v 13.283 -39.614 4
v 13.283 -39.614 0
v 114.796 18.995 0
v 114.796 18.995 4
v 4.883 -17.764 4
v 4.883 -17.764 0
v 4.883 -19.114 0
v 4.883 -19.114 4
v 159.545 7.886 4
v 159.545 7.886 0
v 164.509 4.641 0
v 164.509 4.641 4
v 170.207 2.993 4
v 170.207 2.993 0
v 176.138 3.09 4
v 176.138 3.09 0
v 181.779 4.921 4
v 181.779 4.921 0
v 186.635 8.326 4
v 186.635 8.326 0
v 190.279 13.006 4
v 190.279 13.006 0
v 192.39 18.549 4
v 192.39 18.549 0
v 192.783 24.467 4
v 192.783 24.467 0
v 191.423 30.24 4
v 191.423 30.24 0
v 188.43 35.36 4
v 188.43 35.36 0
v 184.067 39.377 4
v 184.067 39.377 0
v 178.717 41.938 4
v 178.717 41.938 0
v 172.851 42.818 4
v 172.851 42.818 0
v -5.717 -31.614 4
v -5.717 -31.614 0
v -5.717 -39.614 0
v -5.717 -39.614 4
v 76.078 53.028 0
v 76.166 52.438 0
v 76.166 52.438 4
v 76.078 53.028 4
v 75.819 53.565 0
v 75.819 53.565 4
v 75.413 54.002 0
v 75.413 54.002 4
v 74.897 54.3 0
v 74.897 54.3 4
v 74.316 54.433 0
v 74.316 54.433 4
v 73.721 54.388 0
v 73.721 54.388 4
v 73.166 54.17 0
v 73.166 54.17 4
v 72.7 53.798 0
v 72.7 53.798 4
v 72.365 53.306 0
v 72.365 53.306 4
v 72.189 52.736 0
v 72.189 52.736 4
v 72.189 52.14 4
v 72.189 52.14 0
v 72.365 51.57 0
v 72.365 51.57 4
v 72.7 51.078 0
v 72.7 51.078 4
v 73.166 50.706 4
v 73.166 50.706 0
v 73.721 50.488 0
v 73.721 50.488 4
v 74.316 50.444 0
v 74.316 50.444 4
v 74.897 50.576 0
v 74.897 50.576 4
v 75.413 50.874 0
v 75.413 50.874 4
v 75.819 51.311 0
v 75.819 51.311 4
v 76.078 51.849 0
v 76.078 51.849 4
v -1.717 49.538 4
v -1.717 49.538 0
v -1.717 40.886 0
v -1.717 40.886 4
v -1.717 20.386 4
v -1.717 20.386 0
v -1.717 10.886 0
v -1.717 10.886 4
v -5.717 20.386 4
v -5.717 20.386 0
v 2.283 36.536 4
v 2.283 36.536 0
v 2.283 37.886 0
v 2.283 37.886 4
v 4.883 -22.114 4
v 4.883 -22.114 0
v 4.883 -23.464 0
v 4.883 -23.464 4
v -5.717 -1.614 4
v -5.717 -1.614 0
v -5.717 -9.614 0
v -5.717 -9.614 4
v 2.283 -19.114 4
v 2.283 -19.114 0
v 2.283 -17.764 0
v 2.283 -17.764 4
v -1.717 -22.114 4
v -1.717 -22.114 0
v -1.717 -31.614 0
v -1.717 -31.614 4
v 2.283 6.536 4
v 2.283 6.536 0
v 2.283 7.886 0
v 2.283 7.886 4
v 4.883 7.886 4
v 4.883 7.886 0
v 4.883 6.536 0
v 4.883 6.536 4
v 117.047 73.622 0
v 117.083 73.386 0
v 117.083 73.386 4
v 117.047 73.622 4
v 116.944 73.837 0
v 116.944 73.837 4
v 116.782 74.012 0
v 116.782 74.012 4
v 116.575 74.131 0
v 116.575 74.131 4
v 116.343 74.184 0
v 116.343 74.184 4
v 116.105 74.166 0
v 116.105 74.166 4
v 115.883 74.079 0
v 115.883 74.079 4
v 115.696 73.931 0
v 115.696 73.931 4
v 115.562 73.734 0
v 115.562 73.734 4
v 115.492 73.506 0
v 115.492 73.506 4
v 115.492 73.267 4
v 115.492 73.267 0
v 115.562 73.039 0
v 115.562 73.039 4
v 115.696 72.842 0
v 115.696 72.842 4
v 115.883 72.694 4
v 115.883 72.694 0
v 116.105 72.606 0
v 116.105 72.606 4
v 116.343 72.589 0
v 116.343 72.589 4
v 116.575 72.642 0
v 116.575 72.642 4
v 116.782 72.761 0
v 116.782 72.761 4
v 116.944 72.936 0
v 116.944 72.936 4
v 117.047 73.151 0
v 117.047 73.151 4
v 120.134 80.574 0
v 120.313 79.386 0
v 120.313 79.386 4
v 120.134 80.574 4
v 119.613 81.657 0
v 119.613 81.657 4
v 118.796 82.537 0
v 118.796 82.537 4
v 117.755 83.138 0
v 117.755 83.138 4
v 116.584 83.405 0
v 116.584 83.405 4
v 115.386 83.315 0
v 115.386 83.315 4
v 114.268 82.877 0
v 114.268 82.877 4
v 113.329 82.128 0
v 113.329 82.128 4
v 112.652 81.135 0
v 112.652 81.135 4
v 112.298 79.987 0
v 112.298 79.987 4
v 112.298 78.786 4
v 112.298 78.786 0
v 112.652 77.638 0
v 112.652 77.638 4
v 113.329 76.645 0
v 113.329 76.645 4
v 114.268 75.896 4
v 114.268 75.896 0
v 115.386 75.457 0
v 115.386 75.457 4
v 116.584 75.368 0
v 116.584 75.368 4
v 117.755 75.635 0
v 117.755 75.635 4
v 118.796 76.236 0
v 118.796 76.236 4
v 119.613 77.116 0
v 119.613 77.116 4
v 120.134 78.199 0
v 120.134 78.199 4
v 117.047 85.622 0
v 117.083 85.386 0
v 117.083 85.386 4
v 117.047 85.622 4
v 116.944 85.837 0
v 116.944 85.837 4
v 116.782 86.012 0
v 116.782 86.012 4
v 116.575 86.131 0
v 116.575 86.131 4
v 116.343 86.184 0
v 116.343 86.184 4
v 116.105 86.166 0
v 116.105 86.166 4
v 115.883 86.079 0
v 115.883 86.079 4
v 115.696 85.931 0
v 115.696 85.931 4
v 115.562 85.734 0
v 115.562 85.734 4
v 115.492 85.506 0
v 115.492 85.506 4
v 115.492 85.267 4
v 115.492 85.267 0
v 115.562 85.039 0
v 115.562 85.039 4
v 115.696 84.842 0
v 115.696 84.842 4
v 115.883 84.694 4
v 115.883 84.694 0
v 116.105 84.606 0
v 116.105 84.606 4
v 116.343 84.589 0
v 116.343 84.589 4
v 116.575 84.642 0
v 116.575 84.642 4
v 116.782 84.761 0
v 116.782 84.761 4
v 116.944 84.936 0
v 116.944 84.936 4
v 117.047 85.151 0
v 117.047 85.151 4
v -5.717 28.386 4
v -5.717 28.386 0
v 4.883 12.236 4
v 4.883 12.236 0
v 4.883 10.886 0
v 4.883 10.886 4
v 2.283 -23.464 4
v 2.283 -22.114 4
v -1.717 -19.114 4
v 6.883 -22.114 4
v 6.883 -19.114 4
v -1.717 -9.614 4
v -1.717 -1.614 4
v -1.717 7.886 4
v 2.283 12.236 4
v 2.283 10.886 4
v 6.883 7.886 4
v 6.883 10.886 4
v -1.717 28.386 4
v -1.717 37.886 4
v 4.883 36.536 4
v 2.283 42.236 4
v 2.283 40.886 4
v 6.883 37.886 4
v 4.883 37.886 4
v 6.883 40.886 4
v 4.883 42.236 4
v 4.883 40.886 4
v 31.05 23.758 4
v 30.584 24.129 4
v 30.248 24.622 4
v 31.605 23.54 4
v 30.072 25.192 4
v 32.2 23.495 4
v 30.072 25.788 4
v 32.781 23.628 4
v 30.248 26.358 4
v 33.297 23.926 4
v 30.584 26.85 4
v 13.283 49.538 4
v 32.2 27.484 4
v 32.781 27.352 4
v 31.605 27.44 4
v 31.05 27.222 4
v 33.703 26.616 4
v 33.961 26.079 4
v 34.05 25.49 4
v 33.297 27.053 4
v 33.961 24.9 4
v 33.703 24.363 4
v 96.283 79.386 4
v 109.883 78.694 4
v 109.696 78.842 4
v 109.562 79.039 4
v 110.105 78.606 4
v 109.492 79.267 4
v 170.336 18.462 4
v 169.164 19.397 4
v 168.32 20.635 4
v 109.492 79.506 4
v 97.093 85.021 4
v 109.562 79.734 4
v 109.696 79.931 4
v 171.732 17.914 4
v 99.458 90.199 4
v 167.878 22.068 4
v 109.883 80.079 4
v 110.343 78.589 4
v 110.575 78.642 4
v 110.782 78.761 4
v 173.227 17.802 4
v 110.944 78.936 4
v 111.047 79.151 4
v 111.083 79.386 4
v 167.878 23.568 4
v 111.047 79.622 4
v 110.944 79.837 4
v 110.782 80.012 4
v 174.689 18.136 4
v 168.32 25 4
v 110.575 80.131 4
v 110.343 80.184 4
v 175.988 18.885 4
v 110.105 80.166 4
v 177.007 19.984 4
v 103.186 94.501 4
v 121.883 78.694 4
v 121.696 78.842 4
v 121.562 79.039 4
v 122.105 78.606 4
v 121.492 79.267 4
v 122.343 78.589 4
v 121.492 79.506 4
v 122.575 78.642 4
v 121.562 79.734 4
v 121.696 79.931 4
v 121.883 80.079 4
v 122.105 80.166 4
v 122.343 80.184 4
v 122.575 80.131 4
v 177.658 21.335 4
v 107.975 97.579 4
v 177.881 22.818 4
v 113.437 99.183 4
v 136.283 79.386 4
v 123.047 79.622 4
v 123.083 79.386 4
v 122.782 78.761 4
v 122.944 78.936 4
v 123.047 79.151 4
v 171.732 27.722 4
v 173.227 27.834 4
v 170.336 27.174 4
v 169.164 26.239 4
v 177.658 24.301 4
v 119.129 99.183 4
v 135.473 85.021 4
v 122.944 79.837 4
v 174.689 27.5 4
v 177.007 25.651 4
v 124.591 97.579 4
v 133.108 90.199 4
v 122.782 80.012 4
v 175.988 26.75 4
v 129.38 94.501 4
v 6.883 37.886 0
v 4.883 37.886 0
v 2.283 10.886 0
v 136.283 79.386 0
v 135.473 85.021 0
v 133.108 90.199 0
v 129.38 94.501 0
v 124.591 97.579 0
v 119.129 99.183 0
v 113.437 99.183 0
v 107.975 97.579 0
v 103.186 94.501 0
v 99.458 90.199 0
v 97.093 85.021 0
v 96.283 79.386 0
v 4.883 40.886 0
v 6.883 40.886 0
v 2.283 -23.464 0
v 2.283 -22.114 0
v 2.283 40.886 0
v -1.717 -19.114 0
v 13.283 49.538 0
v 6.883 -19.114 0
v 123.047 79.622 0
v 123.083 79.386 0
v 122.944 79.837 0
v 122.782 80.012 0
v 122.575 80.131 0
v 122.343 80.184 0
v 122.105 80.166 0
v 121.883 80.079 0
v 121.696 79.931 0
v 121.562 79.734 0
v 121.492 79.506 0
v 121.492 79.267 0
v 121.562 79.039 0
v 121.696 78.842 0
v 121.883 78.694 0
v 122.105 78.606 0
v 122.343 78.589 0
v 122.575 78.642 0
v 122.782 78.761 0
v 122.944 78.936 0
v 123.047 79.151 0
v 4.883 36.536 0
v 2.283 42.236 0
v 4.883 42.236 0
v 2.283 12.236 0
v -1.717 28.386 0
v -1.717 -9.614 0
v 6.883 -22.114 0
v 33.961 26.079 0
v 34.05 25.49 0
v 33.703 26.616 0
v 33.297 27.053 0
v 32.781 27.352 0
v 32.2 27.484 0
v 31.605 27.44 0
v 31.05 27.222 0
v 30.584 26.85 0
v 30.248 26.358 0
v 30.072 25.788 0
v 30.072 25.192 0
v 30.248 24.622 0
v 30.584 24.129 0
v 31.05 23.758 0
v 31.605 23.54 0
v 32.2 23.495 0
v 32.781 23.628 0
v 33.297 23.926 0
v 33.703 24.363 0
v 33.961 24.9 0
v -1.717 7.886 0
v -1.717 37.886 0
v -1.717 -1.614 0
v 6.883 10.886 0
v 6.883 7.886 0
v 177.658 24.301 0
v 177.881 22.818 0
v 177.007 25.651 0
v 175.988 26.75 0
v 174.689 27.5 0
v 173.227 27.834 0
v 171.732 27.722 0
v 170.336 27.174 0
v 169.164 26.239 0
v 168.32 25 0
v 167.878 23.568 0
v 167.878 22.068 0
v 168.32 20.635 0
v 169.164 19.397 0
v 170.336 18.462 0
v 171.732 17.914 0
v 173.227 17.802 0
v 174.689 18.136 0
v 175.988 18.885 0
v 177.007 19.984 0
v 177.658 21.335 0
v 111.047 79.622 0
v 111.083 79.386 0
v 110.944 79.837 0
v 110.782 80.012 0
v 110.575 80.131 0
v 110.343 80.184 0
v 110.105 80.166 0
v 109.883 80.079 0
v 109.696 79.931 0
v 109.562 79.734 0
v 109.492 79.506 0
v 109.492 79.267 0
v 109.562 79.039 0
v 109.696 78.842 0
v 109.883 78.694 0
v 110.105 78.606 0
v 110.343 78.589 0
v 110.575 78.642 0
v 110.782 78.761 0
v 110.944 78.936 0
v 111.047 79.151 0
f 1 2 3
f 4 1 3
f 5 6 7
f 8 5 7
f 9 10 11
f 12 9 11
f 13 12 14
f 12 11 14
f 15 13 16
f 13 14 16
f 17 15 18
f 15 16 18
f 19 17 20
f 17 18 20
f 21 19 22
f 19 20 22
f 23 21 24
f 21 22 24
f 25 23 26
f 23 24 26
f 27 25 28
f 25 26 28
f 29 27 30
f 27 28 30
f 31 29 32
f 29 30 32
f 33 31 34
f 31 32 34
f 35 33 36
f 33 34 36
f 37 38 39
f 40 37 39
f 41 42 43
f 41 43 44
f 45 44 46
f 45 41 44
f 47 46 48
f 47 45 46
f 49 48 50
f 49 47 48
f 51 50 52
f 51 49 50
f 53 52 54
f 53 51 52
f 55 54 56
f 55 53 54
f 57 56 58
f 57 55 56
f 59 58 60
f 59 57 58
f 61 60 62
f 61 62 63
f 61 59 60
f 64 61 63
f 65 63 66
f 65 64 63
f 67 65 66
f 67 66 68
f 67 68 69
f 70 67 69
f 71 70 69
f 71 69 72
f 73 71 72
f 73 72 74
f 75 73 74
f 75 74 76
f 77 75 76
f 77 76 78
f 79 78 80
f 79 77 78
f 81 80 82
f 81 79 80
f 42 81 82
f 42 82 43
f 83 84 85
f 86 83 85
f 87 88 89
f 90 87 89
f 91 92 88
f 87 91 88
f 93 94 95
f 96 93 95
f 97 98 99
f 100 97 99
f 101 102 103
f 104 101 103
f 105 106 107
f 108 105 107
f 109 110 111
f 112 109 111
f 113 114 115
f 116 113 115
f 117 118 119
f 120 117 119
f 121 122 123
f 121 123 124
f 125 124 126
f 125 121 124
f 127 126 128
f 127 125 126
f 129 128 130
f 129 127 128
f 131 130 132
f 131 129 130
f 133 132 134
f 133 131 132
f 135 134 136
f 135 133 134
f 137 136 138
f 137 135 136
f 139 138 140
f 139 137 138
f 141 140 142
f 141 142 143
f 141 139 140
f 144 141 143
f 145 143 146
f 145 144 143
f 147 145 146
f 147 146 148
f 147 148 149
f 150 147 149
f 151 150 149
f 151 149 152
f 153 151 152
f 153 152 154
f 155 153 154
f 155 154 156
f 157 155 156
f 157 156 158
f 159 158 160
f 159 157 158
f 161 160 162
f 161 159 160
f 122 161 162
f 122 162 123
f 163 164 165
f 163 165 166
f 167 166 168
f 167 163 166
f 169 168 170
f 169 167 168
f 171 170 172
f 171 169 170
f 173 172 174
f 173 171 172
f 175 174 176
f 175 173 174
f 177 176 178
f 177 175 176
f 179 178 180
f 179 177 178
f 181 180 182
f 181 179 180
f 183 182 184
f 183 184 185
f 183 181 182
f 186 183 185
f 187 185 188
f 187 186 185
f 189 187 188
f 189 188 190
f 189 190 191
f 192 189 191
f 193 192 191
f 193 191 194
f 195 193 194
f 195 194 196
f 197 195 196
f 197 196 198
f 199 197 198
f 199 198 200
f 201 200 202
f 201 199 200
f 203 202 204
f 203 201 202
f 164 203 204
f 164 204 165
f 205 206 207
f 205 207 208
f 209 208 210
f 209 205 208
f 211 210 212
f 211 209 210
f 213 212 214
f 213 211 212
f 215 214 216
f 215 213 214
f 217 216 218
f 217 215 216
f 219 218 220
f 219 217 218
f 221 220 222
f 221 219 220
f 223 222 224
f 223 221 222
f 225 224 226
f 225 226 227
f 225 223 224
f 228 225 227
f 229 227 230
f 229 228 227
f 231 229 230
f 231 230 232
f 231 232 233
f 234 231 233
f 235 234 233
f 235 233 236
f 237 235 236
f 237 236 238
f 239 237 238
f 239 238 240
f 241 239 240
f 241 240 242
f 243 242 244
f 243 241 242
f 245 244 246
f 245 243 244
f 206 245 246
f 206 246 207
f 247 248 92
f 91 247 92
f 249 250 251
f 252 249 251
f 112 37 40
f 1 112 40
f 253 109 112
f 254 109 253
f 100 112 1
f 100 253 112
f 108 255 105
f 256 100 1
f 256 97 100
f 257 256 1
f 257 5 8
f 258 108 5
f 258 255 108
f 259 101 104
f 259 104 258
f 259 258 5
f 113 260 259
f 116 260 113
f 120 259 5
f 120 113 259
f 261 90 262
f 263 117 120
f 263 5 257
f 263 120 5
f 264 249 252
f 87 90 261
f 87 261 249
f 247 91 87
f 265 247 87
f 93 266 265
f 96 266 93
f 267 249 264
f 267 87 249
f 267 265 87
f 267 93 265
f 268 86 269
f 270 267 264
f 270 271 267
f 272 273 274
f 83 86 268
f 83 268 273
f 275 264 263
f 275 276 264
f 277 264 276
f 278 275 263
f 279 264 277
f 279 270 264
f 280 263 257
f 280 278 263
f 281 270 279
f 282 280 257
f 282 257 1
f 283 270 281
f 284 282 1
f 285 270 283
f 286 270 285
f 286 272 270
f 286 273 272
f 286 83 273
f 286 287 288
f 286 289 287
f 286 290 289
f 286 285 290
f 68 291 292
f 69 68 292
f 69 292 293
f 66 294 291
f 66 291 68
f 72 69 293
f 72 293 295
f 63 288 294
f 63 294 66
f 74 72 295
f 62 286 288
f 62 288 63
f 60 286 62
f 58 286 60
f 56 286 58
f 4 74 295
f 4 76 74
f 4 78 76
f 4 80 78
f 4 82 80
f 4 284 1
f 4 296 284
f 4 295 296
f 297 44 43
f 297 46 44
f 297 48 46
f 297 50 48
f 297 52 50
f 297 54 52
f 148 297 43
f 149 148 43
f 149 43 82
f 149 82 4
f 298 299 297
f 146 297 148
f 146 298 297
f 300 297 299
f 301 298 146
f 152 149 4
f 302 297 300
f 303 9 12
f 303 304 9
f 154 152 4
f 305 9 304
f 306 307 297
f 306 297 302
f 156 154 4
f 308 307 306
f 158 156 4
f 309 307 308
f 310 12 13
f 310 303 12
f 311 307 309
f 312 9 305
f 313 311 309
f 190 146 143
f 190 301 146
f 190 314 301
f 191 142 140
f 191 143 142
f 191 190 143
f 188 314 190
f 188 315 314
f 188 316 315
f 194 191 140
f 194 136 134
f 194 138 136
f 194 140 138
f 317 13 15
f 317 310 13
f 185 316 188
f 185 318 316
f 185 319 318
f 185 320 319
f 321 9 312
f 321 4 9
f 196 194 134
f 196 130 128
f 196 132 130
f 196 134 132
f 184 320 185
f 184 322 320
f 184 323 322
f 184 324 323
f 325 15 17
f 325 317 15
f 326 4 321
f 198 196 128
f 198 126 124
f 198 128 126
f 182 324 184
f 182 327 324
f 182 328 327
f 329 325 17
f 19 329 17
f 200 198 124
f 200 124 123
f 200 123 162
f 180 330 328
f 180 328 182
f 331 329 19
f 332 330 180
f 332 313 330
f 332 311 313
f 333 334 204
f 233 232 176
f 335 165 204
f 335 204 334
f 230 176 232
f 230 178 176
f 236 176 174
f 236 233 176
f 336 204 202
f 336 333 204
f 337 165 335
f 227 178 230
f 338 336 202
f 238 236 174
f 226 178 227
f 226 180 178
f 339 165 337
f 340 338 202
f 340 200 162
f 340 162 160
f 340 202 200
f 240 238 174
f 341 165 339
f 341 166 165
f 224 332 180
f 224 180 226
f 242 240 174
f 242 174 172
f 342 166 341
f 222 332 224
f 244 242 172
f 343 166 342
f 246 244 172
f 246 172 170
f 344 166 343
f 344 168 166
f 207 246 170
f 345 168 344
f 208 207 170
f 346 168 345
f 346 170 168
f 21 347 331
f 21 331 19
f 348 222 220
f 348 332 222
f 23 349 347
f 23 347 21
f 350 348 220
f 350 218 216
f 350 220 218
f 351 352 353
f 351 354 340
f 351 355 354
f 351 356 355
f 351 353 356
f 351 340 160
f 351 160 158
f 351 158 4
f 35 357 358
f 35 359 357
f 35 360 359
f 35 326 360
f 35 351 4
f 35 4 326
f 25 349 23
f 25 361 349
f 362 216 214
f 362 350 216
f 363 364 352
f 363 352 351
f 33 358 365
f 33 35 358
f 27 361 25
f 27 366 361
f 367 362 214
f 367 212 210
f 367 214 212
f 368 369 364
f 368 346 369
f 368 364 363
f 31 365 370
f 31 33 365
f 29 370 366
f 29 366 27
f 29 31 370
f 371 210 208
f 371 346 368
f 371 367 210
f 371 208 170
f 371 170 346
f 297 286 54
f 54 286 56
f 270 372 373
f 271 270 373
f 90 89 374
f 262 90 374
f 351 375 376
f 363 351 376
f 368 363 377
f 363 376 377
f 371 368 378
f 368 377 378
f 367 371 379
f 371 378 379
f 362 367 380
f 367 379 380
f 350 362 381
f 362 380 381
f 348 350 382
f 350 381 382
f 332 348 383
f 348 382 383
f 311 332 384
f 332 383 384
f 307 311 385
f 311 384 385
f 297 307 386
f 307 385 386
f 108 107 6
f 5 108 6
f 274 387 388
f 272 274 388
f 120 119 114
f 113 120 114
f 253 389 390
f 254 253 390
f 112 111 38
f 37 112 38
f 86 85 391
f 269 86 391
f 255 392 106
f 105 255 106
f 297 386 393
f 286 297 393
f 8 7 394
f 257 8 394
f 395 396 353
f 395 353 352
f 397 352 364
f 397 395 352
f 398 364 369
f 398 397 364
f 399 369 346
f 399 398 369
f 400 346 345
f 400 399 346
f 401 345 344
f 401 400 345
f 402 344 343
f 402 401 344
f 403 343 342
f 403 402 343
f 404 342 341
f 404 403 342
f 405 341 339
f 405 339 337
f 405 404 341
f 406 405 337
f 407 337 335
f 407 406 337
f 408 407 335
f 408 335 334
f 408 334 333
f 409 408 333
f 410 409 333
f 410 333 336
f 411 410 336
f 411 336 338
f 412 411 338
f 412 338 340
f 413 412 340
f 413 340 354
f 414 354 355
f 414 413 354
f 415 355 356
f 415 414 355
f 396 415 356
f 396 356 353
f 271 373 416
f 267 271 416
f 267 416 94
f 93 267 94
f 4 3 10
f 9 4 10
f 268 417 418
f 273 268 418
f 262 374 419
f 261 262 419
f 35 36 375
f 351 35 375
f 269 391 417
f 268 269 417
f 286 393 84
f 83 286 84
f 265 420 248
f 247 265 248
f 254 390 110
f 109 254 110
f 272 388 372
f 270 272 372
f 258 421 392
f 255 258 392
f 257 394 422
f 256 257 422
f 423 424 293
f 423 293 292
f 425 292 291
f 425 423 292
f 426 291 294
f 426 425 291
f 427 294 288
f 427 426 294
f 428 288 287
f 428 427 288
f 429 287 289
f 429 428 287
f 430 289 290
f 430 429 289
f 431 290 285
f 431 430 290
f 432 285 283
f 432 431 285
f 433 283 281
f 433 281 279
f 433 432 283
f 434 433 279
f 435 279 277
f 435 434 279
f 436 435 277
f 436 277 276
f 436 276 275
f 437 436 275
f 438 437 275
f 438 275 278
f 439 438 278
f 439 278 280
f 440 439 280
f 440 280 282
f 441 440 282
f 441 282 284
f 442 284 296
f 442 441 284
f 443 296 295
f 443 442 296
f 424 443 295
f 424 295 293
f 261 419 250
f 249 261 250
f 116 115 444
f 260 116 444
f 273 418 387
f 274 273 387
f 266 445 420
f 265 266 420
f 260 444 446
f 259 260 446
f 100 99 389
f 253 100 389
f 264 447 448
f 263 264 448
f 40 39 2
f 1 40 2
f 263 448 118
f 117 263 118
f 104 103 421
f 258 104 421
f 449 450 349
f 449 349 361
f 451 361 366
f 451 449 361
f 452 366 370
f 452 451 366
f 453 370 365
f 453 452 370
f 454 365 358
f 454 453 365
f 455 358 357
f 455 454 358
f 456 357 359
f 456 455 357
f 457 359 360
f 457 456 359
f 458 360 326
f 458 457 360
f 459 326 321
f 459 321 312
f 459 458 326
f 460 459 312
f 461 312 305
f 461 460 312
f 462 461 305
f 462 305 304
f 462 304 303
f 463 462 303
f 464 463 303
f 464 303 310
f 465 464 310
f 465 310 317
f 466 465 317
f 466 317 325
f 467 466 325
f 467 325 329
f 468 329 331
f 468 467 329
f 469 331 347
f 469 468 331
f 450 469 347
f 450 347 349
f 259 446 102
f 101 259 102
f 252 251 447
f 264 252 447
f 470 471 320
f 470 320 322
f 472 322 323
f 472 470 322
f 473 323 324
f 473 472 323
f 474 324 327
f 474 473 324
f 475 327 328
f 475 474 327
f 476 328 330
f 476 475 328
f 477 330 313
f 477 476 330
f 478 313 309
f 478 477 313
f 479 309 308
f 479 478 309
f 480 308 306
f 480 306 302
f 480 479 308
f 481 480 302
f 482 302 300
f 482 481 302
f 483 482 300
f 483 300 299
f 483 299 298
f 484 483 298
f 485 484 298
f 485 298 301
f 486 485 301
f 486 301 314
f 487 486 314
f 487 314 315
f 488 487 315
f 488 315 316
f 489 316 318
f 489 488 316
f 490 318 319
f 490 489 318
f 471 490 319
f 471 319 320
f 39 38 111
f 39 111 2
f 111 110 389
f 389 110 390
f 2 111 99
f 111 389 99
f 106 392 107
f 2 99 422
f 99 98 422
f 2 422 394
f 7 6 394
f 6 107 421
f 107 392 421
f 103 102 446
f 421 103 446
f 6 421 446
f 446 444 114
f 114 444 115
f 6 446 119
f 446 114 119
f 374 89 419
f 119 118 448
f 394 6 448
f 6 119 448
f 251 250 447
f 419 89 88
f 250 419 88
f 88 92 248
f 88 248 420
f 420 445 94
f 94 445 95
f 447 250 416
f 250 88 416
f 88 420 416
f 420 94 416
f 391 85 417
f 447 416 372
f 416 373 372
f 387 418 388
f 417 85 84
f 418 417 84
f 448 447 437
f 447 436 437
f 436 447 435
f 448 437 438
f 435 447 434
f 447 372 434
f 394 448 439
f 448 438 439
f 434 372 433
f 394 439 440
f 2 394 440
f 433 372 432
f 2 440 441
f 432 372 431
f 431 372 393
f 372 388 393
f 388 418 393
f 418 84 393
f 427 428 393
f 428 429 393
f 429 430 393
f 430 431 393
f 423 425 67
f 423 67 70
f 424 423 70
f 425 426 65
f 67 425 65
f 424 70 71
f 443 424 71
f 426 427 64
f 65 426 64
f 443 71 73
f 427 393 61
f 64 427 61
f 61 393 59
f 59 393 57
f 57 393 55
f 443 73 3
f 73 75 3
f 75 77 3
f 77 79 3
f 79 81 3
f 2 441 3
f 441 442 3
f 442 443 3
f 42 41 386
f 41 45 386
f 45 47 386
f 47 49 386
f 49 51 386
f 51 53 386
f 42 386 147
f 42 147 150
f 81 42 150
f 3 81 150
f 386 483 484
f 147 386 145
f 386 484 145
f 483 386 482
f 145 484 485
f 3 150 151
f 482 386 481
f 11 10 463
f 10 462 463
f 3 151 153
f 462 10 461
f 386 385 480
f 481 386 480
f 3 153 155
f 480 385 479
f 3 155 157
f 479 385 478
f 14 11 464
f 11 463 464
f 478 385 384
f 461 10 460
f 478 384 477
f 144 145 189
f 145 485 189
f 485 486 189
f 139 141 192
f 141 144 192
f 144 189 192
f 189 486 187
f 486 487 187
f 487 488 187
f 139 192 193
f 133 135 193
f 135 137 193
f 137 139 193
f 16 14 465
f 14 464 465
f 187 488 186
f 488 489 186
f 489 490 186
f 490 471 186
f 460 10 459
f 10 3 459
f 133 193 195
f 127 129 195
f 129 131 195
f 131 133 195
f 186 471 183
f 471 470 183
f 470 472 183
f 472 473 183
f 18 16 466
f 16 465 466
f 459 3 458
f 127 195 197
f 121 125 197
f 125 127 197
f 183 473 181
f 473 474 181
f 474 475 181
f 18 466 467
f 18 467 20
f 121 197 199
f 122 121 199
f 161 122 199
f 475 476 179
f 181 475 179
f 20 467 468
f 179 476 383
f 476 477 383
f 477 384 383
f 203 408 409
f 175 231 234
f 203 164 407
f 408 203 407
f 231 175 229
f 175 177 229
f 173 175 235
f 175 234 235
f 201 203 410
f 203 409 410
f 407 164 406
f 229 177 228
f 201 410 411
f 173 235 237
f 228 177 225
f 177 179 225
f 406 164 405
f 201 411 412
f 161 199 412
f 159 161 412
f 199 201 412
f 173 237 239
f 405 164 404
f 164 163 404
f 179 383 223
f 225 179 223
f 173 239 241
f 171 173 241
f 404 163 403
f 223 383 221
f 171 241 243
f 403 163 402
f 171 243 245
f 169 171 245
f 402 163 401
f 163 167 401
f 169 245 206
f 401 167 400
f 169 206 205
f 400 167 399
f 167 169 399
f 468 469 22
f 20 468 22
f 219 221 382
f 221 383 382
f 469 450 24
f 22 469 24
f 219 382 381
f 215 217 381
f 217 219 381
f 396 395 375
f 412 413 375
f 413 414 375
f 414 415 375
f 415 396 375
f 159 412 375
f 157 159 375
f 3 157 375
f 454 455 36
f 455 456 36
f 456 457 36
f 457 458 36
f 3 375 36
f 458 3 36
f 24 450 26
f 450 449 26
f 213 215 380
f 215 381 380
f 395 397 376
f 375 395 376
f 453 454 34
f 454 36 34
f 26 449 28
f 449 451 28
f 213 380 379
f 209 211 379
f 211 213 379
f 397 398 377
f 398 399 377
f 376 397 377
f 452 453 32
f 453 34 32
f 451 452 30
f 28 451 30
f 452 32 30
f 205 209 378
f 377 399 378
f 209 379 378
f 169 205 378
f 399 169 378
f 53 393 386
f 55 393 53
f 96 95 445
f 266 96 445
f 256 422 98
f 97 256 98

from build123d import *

# Parameters (mm, degrees)
SKETCH_1_R      = 2
SKETCH_1_R_2    = 5.03
SKETCH_1_R_3    = 0.8
SKETCH_1_R_4    = 4.03
EXTRUDE_1_DEPTH = 4


with BuildPart() as part:
    # 草图1 → 凸台-拉伸1 (new body)
    with BuildSketch(Plane.XY):
        with BuildLine():
            Line((2.282857143, -22.113571429), (-1.717142857, -22.113571429))
            Line((-1.717142857, -22.113571429), (-1.717142857, -31.613571429))
            Line((-1.717142857, -31.613571429), (-5.717142857, -31.613571429))
            Line((-5.717142857, -31.613571429), (-5.717142857, -39.613571429))
            Line((-5.717142857, -39.613571429), (-1.717142857, -39.613571429))
            Line((-1.717142857, -39.613571429), (13.282857143, -39.613571429))
            Line((13.282857143, -39.613571429), (114.795824144, 18.994967396))
            Line((114.795824144, 18.994967396), (159.545326709, 7.886428571))
            ThreePointArc((159.545326709, 7.886428571), (191.541358842, 15.698516375), (172.851399638, 42.817886077))
            Line((172.851399638, 42.817886077), (136.282857143, 79.386428571))
            ThreePointArc((136.282857143, 79.386428571), (116.282857143, 99.386428571), (96.282857143, 79.386428571))
            Line((96.282857143, 79.386428571), (13.282857143, 49.538084372))
            Line((13.282857143, 49.538084372), (-1.717142857, 49.538084372))
            Line((-1.717142857, 49.538084372), (-1.717142857, 40.886428571))
            Line((-1.717142857, 40.886428571), (2.282857143, 40.886428571))
            Line((2.282857143, 40.886428571), (2.282857143, 42.236428571))
            Line((2.282857143, 42.236428571), (4.882857143, 42.236428571))
            Line((4.882857143, 42.236428571), (4.882857143, 40.886428571))
            Line((4.882857143, 40.886428571), (6.882857143, 40.886428571))
            Line((6.882857143, 40.886428571), (6.882857143, 37.886428571))
            Line((6.882857143, 37.886428571), (4.882857143, 37.886428571))
            Line((4.882857143, 37.886428571), (4.882857143, 36.536428571))
            Line((4.882857143, 36.536428571), (2.282857143, 36.536428571))
            Line((2.282857143, 36.536428571), (2.282857143, 37.886428571))
            Line((2.282857143, 37.886428571), (-1.717142857, 37.886428571))
            Line((-1.717142857, 37.886428571), (-1.717142857, 28.386428571))
            Line((-1.717142857, 28.386428571), (-5.717142857, 28.386428571))
            Line((-5.717142857, 28.386428571), (-5.717142857, 20.386428571))
            Line((-5.717142857, 20.386428571), (-1.717142857, 20.386428571))
            Line((-1.717142857, 20.386428571), (-1.717142857, 10.886428571))
            Line((-1.717142857, 10.886428571), (2.282857143, 10.886428571))
            Line((2.282857143, 10.886428571), (2.282857143, 12.236428571))
            Line((2.282857143, 12.236428571), (4.882857143, 12.236428571))
            Line((4.882857143, 12.236428571), (4.882857143, 10.886428571))
            Line((4.882857143, 10.886428571), (6.882857143, 10.886428571))
            Line((6.882857143, 10.886428571), (6.882857143, 7.886428571))
            Line((6.882857143, 7.886428571), (4.882857143, 7.886428571))
            Line((4.882857143, 7.886428571), (4.882857143, 6.536428571))
            Line((4.882857143, 6.536428571), (2.282857143, 6.536428571))
            Line((2.282857143, 6.536428571), (2.282857143, 7.886428571))
            Line((2.282857143, 7.886428571), (-1.717142857, 7.886428571))
            Line((-1.717142857, 7.886428571), (-1.717142857, -1.613571429))
            Line((-1.717142857, -1.613571429), (-5.717142857, -1.613571429))
            Line((-5.717142857, -1.613571429), (-5.717142857, -9.613571429))
            Line((-5.717142857, -9.613571429), (-1.717142857, -9.613571429))
            Line((-1.717142857, -9.613571429), (-1.717142857, -19.113571429))
            Line((-1.717142857, -19.113571429), (2.282857143, -19.113571429))
            Line((2.282857143, -19.113571429), (2.282857143, -17.763571429))
            Line((2.282857143, -17.763571429), (4.882857143, -17.763571429))
            Line((4.882857143, -17.763571429), (4.882857143, -19.113571429))
            Line((4.882857143, -19.113571429), (6.882857143, -19.113571429))
            Line((6.882857143, -19.113571429), (6.882857143, -22.113571429))
            Line((6.882857143, -22.113571429), (4.882857143, -22.113571429))
            Line((4.882857143, -22.113571429), (4.882857143, -23.463571429))
            Line((4.882857143, -23.463571429), (2.282857143, -23.463571429))
            Line((2.282857143, -23.463571429), (2.282857143, -22.113571429))
        make_face()
        with Locations((32.050124236, 25.489798741)):
            Circle(SKETCH_1_R, mode=Mode.SUBTRACT)
        with Locations((172.851399638, 22.817886077)):
            Circle(SKETCH_1_R_2, mode=Mode.SUBTRACT)
        with Locations((74.16649069, 52.438113656)):
            Circle(SKETCH_1_R, mode=Mode.SUBTRACT)
        with Locations((116.282857143, 73.386428571)):
            Circle(SKETCH_1_R_3, mode=Mode.SUBTRACT)
        with Locations((110.282857143, 79.386428571)):
            Circle(SKETCH_1_R_3, mode=Mode.SUBTRACT)
        with Locations((116.282857143, 79.386428571)):
            Circle(SKETCH_1_R_4, mode=Mode.SUBTRACT)
        with Locations((122.282857143, 79.386428571)):
            Circle(SKETCH_1_R_3, mode=Mode.SUBTRACT)
        with Locations((116.282857143, 85.386428571)):
            Circle(SKETCH_1_R_3, mode=Mode.SUBTRACT)
    extrude(amount=EXTRUDE_1_DEPTH)


solid = part.part
